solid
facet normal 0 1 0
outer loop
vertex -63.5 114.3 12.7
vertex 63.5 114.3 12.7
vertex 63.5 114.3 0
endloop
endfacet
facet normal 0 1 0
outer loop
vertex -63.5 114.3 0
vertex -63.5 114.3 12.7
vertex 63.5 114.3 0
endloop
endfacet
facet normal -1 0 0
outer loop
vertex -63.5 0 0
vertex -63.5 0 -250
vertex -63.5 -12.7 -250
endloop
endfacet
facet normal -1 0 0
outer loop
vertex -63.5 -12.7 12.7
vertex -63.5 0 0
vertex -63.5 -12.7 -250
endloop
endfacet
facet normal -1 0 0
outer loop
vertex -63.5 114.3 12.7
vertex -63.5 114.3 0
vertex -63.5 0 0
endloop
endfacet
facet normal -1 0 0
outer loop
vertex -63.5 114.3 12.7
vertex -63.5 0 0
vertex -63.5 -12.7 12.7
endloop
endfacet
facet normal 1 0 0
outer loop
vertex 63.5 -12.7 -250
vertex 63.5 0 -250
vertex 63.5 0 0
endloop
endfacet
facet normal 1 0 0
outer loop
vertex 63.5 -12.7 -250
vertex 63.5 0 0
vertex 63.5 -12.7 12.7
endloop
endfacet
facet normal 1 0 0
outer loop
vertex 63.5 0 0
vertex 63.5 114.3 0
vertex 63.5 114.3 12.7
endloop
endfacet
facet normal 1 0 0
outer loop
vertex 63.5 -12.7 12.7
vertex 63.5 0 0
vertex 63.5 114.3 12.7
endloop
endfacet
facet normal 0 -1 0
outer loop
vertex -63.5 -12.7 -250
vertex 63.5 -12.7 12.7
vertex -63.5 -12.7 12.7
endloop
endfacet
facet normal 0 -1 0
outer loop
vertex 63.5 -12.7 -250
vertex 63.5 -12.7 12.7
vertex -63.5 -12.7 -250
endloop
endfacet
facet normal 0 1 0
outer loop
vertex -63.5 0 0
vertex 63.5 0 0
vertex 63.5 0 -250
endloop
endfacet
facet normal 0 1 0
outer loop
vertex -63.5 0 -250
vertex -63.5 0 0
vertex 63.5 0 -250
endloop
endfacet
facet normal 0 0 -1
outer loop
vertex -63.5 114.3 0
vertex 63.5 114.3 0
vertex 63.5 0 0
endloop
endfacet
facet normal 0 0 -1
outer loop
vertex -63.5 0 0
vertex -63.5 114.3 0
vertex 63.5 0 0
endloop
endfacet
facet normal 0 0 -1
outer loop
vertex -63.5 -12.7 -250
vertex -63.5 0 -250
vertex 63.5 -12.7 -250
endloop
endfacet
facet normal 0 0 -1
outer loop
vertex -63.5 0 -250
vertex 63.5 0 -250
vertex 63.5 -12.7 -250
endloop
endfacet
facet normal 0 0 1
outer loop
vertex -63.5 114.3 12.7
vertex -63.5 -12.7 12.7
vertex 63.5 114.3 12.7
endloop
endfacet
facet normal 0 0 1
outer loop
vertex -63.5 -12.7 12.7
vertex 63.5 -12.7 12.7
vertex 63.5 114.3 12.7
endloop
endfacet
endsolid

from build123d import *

# Parameters (mm, degrees)
BOSS_EXTRUDE1_DEPTH = 63.5


with BuildPart() as part:
    # Sketch1 → Boss-Extrude1 (new, symmetric)
    with BuildSketch(Plane(origin=(0, 0, 0), x_dir=(0, 0, -1), z_dir=(1, 0, 0))):
        Polygon((0, 0), (250, 0), (250, -12.7), (0, -12.7), (-12.7, -12.7), (-12.7, 114.3), (0, 114.3), align=None)
    extrude(amount=BOSS_EXTRUDE1_DEPTH, both=True)


solid = part.part
